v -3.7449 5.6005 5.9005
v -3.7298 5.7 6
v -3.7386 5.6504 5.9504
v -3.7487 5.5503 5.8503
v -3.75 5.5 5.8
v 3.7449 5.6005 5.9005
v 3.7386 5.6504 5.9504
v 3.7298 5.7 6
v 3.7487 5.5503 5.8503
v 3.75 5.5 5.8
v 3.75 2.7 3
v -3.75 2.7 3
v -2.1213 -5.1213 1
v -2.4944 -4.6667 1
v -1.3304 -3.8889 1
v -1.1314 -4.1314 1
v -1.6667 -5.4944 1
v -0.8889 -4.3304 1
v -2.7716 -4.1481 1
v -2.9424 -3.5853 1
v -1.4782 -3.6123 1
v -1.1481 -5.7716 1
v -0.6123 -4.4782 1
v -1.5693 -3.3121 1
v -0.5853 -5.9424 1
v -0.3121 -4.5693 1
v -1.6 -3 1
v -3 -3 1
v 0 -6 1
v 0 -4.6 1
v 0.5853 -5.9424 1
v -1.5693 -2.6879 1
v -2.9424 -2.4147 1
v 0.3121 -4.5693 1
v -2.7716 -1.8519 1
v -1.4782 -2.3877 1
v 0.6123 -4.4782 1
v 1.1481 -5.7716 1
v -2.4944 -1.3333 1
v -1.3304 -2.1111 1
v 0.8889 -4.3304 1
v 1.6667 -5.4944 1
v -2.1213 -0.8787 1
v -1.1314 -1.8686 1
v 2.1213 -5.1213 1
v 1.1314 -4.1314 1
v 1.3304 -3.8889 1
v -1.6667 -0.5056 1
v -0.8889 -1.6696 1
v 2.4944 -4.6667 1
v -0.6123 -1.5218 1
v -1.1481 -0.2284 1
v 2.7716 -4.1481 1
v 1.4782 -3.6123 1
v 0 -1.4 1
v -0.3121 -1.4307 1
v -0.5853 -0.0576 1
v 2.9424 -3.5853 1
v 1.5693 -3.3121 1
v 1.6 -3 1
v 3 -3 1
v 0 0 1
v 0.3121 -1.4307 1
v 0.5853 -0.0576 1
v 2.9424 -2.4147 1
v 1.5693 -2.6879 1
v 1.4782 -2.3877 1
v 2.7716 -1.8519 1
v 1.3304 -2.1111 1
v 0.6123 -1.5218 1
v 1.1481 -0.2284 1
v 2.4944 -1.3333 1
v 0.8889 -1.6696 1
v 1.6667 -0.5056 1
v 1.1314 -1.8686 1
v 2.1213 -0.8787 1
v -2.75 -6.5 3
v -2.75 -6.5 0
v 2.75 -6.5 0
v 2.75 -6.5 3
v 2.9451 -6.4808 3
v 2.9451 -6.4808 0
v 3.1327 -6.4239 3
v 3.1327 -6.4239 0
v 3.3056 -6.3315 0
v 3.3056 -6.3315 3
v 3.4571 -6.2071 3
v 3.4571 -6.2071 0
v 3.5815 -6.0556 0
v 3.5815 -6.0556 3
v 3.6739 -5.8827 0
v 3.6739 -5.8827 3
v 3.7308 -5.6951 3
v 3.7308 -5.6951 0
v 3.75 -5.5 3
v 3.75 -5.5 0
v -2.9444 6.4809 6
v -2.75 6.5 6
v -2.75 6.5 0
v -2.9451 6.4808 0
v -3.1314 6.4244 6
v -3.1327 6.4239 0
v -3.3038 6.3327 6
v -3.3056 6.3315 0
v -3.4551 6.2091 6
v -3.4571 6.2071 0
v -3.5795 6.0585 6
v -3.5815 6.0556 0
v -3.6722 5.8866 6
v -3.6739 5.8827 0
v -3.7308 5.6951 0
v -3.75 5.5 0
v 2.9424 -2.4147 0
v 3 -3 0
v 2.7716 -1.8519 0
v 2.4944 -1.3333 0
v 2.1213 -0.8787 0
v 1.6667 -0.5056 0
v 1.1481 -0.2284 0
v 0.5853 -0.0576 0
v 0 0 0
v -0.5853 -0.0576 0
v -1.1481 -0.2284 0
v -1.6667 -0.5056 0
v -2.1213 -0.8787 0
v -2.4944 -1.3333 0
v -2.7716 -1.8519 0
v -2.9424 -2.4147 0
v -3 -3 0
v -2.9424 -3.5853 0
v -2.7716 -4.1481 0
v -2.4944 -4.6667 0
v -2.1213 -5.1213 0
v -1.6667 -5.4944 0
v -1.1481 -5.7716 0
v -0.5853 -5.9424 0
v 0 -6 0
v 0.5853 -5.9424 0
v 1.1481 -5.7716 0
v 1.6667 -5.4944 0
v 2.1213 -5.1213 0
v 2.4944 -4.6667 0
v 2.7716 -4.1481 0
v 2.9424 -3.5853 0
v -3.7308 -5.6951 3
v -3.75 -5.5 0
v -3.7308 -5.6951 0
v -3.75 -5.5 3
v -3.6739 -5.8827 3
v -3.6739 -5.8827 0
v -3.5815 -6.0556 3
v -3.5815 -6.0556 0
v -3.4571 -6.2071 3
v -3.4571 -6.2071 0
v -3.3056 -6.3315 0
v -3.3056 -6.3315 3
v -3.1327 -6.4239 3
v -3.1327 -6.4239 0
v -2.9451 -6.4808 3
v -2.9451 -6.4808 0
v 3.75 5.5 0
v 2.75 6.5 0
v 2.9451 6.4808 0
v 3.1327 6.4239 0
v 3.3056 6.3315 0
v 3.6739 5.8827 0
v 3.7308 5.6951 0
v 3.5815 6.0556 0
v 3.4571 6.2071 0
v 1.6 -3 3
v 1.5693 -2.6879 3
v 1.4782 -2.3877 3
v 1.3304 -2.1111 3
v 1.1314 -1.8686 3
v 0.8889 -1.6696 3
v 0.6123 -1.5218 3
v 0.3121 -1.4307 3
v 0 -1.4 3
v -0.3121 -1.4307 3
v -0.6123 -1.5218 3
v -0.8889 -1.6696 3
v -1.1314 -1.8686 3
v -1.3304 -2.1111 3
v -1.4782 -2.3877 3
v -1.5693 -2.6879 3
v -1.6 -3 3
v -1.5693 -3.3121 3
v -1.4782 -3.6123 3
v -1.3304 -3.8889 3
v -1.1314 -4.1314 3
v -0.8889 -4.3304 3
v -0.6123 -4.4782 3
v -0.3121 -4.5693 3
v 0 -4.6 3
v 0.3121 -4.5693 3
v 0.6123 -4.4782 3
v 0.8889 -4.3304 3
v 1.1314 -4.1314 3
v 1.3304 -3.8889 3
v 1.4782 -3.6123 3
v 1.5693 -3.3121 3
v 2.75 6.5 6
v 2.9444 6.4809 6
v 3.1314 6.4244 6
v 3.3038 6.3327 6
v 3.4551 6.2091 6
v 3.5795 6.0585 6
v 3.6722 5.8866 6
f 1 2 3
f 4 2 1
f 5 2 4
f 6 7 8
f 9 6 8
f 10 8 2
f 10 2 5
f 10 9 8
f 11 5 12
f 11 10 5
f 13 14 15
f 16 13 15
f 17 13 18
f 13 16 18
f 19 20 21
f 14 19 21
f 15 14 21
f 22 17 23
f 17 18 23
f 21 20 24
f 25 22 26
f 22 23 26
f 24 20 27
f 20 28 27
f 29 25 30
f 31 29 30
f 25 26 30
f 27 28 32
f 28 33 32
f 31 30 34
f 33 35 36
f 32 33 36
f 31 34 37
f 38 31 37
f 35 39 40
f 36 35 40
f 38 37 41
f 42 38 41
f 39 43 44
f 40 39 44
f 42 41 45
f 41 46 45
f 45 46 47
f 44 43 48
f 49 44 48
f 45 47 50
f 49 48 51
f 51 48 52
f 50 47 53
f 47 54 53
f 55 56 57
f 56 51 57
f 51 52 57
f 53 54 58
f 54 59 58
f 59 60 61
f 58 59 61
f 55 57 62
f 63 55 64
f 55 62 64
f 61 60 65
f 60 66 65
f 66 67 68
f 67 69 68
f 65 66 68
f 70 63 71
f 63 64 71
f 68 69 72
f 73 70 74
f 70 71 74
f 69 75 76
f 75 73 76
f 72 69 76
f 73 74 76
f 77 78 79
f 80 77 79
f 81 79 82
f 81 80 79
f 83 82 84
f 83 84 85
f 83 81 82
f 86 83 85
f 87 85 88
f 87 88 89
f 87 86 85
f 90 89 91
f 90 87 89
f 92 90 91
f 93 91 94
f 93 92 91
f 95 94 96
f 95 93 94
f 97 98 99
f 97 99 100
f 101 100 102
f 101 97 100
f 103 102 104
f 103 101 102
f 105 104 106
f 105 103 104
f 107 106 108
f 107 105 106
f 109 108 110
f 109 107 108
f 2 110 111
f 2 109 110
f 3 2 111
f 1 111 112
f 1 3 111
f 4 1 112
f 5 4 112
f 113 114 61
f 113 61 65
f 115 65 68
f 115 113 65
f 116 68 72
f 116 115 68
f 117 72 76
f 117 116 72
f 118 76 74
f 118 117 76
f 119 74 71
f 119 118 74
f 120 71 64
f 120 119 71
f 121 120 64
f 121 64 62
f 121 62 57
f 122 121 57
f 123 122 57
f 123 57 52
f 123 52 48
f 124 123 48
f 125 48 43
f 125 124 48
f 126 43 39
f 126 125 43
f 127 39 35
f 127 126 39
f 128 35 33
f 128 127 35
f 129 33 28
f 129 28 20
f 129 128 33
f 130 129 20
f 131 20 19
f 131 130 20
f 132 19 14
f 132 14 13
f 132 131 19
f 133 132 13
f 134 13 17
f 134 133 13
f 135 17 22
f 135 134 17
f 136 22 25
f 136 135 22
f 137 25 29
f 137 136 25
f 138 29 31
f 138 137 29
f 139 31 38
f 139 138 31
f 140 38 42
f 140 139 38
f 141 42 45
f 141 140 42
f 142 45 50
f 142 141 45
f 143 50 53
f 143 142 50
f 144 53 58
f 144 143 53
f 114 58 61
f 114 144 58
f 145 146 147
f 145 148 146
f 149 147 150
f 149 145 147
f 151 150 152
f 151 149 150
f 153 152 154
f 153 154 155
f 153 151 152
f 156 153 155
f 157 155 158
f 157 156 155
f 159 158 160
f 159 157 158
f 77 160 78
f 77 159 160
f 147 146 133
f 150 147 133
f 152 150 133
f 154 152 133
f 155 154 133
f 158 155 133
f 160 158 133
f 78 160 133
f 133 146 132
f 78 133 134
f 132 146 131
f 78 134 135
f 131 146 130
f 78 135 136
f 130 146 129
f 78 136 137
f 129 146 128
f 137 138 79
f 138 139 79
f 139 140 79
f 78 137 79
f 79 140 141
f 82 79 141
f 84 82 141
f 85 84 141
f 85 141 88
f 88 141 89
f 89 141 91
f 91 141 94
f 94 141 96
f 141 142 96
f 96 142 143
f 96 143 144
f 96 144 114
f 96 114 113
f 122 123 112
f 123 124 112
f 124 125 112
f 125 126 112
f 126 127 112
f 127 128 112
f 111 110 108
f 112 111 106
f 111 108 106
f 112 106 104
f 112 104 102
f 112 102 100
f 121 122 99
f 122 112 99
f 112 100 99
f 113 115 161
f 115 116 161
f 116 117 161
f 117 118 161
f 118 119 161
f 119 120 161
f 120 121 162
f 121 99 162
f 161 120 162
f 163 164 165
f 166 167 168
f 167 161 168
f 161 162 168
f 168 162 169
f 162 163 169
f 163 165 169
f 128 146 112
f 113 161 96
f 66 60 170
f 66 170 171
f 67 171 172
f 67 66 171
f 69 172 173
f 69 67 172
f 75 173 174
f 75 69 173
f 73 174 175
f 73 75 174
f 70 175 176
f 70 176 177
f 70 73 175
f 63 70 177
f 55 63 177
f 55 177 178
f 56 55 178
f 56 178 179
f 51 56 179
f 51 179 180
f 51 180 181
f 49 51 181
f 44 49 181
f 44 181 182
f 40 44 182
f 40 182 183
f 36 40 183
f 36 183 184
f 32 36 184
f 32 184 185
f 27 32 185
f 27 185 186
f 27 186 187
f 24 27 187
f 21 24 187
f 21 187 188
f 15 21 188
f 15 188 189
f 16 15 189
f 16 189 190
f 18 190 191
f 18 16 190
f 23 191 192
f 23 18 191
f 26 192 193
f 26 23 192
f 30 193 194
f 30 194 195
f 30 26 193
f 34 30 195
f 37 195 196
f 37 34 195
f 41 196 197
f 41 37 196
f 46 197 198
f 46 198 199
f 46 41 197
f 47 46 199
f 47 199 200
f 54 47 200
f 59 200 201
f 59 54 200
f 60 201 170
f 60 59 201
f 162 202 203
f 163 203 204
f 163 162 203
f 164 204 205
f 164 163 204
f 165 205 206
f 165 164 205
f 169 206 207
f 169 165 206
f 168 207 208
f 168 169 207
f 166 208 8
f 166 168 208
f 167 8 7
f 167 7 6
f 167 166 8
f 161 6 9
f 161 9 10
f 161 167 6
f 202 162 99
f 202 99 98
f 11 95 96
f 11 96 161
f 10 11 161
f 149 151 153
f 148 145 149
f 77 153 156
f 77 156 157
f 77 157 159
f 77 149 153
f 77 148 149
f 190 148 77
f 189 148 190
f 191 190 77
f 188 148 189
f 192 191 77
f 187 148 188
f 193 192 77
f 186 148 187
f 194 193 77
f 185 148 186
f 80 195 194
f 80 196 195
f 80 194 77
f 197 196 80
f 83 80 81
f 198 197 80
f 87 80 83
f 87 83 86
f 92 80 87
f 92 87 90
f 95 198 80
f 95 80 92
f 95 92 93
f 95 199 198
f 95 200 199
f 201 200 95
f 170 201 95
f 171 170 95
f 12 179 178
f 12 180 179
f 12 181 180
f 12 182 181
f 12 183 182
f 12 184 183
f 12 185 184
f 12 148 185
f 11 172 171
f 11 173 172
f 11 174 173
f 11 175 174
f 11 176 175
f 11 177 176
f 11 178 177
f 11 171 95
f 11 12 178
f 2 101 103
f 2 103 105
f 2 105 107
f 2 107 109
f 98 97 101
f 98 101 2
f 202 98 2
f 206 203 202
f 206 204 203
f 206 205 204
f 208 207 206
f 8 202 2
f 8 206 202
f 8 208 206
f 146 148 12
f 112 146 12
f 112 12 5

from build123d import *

# Parameters (mm, degrees)
F0_W     = 7.5
F0_H     = 13
F0_R     = 3
F0_R_2   = 1.6
F1_DEPTH = 3
F3_DEPTH = 1
F4_DEPTH = 7.5
F5_R     = 1


with BuildPart() as f1:
    # F0 (on Top) → F1 (new body)
    with BuildSketch(Plane.XY):
        Rectangle(F0_W, F0_H)
        with Locations((0, -3)):
            Circle(F0_R, mode=Mode.SUBTRACT)
        with Locations((0, -3)):
            Circle(F0_R)
        with Locations((0, -3)):
            Circle(F0_R_2, mode=Mode.SUBTRACT)
    extrude(amount=F1_DEPTH)

    # F0 (on Top) → F3 (cut)
    with BuildSketch(Plane.XY):
        with Locations((0, -3)):
            Circle(F0_R)
        with Locations((0, -3)):
            Circle(F0_R_2, mode=Mode.SUBTRACT)
    extrude(amount=F3_DEPTH, mode=Mode.SUBTRACT)

    # F2 (on face) → F4 (join, through all)
    with BuildSketch(Plane.YZ.offset(3.75)):
        Polygon((2.7, 3), (6.5, 3), (6.5, 6), (5.7, 6), align=None)
    extrude(amount=-F4_DEPTH)

    # F5
    f5_edges = [f1.edges().sort_by_distance(p)[0] for p in [
        (3.75, -6.5, 1.5),
        (-3.75, -6.5, 1.5),
        (3.75, 6.5, 3),
        (-3.75, 6.5, 3),
    ]]
    fillet(f5_edges, radius=F5_R)


solid = f1.part
